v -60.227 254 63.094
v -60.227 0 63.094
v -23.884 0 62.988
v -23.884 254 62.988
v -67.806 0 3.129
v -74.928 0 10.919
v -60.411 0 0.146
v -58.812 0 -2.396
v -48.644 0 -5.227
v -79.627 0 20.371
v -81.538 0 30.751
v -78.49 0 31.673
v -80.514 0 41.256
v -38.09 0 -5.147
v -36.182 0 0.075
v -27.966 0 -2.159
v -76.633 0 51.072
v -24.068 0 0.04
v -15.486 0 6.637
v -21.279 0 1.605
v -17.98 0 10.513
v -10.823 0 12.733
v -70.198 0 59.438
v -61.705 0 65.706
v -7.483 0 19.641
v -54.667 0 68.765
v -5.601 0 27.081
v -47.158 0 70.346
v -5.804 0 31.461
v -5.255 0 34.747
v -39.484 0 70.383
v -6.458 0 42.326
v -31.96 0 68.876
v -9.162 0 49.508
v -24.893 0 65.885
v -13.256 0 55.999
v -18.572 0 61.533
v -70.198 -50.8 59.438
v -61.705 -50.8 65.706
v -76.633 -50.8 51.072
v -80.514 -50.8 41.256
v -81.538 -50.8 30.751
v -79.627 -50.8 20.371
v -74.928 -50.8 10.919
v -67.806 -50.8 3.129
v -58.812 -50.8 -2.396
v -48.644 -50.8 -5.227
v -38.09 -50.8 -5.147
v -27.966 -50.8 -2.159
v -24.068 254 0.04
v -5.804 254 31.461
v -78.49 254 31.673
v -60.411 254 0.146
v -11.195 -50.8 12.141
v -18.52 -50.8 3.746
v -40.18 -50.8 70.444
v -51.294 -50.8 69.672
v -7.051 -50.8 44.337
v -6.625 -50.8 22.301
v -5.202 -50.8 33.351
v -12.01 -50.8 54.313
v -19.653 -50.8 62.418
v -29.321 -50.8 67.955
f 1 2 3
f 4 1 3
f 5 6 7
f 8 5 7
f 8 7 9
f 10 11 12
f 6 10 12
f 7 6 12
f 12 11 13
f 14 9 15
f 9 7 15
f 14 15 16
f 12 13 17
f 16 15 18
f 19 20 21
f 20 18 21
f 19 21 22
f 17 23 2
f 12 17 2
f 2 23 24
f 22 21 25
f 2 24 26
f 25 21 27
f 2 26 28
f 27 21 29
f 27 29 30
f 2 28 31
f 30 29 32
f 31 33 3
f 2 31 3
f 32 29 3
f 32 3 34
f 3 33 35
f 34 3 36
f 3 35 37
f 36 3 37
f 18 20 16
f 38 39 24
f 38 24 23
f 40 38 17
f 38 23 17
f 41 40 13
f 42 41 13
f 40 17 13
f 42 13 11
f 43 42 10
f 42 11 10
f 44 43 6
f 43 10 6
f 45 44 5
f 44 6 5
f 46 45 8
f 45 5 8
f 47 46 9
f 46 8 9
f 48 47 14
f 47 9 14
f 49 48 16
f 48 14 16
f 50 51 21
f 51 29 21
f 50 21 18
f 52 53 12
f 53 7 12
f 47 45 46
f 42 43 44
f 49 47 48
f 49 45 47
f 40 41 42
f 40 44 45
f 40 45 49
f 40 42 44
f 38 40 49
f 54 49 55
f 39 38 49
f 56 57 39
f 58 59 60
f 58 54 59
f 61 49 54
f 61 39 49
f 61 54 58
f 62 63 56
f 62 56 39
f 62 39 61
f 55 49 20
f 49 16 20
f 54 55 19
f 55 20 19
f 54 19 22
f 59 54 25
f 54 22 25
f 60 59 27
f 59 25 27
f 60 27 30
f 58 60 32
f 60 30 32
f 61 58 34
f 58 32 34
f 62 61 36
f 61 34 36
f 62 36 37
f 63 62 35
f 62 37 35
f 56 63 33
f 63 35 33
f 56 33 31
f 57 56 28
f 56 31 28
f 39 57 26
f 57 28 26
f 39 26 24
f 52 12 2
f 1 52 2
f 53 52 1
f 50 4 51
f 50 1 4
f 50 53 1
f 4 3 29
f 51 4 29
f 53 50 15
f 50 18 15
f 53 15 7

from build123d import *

# Parameters (mm, degrees)
F1_DEPTH = 25.4
F2_DEPTH = 127
F3_R     = 37.94188
F4_DEPTH = 50.8
F5_DEPTH = 127
F6_R     = 37.91738
F7_DEPTH = 50.8


with BuildPart() as f1:
    # F0 (on Front) → F1 (new body)
    with BuildSketch(Plane.XZ):
        Polygon((-24.067785, 0.039836), (-5.804424, 31.460671), (-23.883986, 62.987623), (-60.226907, 63.093739), (-78.490267, 31.672904), (-60.410706, 0.145952), align=None)
    extrude(amount=F1_DEPTH)

    # F1_face (on face) → F2 (join)
    with BuildSketch(Plane(origin=(-42.147346, 0, 31.566788), x_dir=(1, 0, 0), z_dir=(0, 1, 0))):
        Polygon((36.342922, 0.106116), (18.079561, 31.526951), (-18.26336, 31.420835), (-36.342922, -0.106116), (-18.079561, -31.526951), (18.26336, -31.420835), align=None)
        Polygon((18.079561, 31.526951), (36.342922, 0.106116), (18.26336, -31.420835), (-18.079561, -31.526951), (-36.342922, -0.106116), (-18.26336, 31.420835), align=None)
    extrude(amount=F2_DEPTH)

    # F3 (on Front) → F4 (join)
    with BuildSketch(Plane.XZ):
        with Locations((-43.137185, 32.617502)):
            Circle(F3_R)
    extrude(amount=F4_DEPTH)

    # F2_face (on face) → F5 (join)
    with BuildSketch(Plane(origin=(-42.147346, 127, 31.566788), x_dir=(1, 0, 0), z_dir=(0, 1, 0))):
        Polygon((18.26336, -31.420835), (36.342922, 0.106116), (18.079561, 31.526951), (-18.26336, 31.420835), (-36.342922, -0.106116), (-18.079561, -31.526951), align=None)
    extrude(amount=F5_DEPTH)

    # F6 (on Front) → F7 (join)
    with BuildSketch(Plane.XZ):
        with Locations((-43.654717, 32.360213)):
            Circle(F6_R)
    extrude(amount=F7_DEPTH)


solid = f1.part
